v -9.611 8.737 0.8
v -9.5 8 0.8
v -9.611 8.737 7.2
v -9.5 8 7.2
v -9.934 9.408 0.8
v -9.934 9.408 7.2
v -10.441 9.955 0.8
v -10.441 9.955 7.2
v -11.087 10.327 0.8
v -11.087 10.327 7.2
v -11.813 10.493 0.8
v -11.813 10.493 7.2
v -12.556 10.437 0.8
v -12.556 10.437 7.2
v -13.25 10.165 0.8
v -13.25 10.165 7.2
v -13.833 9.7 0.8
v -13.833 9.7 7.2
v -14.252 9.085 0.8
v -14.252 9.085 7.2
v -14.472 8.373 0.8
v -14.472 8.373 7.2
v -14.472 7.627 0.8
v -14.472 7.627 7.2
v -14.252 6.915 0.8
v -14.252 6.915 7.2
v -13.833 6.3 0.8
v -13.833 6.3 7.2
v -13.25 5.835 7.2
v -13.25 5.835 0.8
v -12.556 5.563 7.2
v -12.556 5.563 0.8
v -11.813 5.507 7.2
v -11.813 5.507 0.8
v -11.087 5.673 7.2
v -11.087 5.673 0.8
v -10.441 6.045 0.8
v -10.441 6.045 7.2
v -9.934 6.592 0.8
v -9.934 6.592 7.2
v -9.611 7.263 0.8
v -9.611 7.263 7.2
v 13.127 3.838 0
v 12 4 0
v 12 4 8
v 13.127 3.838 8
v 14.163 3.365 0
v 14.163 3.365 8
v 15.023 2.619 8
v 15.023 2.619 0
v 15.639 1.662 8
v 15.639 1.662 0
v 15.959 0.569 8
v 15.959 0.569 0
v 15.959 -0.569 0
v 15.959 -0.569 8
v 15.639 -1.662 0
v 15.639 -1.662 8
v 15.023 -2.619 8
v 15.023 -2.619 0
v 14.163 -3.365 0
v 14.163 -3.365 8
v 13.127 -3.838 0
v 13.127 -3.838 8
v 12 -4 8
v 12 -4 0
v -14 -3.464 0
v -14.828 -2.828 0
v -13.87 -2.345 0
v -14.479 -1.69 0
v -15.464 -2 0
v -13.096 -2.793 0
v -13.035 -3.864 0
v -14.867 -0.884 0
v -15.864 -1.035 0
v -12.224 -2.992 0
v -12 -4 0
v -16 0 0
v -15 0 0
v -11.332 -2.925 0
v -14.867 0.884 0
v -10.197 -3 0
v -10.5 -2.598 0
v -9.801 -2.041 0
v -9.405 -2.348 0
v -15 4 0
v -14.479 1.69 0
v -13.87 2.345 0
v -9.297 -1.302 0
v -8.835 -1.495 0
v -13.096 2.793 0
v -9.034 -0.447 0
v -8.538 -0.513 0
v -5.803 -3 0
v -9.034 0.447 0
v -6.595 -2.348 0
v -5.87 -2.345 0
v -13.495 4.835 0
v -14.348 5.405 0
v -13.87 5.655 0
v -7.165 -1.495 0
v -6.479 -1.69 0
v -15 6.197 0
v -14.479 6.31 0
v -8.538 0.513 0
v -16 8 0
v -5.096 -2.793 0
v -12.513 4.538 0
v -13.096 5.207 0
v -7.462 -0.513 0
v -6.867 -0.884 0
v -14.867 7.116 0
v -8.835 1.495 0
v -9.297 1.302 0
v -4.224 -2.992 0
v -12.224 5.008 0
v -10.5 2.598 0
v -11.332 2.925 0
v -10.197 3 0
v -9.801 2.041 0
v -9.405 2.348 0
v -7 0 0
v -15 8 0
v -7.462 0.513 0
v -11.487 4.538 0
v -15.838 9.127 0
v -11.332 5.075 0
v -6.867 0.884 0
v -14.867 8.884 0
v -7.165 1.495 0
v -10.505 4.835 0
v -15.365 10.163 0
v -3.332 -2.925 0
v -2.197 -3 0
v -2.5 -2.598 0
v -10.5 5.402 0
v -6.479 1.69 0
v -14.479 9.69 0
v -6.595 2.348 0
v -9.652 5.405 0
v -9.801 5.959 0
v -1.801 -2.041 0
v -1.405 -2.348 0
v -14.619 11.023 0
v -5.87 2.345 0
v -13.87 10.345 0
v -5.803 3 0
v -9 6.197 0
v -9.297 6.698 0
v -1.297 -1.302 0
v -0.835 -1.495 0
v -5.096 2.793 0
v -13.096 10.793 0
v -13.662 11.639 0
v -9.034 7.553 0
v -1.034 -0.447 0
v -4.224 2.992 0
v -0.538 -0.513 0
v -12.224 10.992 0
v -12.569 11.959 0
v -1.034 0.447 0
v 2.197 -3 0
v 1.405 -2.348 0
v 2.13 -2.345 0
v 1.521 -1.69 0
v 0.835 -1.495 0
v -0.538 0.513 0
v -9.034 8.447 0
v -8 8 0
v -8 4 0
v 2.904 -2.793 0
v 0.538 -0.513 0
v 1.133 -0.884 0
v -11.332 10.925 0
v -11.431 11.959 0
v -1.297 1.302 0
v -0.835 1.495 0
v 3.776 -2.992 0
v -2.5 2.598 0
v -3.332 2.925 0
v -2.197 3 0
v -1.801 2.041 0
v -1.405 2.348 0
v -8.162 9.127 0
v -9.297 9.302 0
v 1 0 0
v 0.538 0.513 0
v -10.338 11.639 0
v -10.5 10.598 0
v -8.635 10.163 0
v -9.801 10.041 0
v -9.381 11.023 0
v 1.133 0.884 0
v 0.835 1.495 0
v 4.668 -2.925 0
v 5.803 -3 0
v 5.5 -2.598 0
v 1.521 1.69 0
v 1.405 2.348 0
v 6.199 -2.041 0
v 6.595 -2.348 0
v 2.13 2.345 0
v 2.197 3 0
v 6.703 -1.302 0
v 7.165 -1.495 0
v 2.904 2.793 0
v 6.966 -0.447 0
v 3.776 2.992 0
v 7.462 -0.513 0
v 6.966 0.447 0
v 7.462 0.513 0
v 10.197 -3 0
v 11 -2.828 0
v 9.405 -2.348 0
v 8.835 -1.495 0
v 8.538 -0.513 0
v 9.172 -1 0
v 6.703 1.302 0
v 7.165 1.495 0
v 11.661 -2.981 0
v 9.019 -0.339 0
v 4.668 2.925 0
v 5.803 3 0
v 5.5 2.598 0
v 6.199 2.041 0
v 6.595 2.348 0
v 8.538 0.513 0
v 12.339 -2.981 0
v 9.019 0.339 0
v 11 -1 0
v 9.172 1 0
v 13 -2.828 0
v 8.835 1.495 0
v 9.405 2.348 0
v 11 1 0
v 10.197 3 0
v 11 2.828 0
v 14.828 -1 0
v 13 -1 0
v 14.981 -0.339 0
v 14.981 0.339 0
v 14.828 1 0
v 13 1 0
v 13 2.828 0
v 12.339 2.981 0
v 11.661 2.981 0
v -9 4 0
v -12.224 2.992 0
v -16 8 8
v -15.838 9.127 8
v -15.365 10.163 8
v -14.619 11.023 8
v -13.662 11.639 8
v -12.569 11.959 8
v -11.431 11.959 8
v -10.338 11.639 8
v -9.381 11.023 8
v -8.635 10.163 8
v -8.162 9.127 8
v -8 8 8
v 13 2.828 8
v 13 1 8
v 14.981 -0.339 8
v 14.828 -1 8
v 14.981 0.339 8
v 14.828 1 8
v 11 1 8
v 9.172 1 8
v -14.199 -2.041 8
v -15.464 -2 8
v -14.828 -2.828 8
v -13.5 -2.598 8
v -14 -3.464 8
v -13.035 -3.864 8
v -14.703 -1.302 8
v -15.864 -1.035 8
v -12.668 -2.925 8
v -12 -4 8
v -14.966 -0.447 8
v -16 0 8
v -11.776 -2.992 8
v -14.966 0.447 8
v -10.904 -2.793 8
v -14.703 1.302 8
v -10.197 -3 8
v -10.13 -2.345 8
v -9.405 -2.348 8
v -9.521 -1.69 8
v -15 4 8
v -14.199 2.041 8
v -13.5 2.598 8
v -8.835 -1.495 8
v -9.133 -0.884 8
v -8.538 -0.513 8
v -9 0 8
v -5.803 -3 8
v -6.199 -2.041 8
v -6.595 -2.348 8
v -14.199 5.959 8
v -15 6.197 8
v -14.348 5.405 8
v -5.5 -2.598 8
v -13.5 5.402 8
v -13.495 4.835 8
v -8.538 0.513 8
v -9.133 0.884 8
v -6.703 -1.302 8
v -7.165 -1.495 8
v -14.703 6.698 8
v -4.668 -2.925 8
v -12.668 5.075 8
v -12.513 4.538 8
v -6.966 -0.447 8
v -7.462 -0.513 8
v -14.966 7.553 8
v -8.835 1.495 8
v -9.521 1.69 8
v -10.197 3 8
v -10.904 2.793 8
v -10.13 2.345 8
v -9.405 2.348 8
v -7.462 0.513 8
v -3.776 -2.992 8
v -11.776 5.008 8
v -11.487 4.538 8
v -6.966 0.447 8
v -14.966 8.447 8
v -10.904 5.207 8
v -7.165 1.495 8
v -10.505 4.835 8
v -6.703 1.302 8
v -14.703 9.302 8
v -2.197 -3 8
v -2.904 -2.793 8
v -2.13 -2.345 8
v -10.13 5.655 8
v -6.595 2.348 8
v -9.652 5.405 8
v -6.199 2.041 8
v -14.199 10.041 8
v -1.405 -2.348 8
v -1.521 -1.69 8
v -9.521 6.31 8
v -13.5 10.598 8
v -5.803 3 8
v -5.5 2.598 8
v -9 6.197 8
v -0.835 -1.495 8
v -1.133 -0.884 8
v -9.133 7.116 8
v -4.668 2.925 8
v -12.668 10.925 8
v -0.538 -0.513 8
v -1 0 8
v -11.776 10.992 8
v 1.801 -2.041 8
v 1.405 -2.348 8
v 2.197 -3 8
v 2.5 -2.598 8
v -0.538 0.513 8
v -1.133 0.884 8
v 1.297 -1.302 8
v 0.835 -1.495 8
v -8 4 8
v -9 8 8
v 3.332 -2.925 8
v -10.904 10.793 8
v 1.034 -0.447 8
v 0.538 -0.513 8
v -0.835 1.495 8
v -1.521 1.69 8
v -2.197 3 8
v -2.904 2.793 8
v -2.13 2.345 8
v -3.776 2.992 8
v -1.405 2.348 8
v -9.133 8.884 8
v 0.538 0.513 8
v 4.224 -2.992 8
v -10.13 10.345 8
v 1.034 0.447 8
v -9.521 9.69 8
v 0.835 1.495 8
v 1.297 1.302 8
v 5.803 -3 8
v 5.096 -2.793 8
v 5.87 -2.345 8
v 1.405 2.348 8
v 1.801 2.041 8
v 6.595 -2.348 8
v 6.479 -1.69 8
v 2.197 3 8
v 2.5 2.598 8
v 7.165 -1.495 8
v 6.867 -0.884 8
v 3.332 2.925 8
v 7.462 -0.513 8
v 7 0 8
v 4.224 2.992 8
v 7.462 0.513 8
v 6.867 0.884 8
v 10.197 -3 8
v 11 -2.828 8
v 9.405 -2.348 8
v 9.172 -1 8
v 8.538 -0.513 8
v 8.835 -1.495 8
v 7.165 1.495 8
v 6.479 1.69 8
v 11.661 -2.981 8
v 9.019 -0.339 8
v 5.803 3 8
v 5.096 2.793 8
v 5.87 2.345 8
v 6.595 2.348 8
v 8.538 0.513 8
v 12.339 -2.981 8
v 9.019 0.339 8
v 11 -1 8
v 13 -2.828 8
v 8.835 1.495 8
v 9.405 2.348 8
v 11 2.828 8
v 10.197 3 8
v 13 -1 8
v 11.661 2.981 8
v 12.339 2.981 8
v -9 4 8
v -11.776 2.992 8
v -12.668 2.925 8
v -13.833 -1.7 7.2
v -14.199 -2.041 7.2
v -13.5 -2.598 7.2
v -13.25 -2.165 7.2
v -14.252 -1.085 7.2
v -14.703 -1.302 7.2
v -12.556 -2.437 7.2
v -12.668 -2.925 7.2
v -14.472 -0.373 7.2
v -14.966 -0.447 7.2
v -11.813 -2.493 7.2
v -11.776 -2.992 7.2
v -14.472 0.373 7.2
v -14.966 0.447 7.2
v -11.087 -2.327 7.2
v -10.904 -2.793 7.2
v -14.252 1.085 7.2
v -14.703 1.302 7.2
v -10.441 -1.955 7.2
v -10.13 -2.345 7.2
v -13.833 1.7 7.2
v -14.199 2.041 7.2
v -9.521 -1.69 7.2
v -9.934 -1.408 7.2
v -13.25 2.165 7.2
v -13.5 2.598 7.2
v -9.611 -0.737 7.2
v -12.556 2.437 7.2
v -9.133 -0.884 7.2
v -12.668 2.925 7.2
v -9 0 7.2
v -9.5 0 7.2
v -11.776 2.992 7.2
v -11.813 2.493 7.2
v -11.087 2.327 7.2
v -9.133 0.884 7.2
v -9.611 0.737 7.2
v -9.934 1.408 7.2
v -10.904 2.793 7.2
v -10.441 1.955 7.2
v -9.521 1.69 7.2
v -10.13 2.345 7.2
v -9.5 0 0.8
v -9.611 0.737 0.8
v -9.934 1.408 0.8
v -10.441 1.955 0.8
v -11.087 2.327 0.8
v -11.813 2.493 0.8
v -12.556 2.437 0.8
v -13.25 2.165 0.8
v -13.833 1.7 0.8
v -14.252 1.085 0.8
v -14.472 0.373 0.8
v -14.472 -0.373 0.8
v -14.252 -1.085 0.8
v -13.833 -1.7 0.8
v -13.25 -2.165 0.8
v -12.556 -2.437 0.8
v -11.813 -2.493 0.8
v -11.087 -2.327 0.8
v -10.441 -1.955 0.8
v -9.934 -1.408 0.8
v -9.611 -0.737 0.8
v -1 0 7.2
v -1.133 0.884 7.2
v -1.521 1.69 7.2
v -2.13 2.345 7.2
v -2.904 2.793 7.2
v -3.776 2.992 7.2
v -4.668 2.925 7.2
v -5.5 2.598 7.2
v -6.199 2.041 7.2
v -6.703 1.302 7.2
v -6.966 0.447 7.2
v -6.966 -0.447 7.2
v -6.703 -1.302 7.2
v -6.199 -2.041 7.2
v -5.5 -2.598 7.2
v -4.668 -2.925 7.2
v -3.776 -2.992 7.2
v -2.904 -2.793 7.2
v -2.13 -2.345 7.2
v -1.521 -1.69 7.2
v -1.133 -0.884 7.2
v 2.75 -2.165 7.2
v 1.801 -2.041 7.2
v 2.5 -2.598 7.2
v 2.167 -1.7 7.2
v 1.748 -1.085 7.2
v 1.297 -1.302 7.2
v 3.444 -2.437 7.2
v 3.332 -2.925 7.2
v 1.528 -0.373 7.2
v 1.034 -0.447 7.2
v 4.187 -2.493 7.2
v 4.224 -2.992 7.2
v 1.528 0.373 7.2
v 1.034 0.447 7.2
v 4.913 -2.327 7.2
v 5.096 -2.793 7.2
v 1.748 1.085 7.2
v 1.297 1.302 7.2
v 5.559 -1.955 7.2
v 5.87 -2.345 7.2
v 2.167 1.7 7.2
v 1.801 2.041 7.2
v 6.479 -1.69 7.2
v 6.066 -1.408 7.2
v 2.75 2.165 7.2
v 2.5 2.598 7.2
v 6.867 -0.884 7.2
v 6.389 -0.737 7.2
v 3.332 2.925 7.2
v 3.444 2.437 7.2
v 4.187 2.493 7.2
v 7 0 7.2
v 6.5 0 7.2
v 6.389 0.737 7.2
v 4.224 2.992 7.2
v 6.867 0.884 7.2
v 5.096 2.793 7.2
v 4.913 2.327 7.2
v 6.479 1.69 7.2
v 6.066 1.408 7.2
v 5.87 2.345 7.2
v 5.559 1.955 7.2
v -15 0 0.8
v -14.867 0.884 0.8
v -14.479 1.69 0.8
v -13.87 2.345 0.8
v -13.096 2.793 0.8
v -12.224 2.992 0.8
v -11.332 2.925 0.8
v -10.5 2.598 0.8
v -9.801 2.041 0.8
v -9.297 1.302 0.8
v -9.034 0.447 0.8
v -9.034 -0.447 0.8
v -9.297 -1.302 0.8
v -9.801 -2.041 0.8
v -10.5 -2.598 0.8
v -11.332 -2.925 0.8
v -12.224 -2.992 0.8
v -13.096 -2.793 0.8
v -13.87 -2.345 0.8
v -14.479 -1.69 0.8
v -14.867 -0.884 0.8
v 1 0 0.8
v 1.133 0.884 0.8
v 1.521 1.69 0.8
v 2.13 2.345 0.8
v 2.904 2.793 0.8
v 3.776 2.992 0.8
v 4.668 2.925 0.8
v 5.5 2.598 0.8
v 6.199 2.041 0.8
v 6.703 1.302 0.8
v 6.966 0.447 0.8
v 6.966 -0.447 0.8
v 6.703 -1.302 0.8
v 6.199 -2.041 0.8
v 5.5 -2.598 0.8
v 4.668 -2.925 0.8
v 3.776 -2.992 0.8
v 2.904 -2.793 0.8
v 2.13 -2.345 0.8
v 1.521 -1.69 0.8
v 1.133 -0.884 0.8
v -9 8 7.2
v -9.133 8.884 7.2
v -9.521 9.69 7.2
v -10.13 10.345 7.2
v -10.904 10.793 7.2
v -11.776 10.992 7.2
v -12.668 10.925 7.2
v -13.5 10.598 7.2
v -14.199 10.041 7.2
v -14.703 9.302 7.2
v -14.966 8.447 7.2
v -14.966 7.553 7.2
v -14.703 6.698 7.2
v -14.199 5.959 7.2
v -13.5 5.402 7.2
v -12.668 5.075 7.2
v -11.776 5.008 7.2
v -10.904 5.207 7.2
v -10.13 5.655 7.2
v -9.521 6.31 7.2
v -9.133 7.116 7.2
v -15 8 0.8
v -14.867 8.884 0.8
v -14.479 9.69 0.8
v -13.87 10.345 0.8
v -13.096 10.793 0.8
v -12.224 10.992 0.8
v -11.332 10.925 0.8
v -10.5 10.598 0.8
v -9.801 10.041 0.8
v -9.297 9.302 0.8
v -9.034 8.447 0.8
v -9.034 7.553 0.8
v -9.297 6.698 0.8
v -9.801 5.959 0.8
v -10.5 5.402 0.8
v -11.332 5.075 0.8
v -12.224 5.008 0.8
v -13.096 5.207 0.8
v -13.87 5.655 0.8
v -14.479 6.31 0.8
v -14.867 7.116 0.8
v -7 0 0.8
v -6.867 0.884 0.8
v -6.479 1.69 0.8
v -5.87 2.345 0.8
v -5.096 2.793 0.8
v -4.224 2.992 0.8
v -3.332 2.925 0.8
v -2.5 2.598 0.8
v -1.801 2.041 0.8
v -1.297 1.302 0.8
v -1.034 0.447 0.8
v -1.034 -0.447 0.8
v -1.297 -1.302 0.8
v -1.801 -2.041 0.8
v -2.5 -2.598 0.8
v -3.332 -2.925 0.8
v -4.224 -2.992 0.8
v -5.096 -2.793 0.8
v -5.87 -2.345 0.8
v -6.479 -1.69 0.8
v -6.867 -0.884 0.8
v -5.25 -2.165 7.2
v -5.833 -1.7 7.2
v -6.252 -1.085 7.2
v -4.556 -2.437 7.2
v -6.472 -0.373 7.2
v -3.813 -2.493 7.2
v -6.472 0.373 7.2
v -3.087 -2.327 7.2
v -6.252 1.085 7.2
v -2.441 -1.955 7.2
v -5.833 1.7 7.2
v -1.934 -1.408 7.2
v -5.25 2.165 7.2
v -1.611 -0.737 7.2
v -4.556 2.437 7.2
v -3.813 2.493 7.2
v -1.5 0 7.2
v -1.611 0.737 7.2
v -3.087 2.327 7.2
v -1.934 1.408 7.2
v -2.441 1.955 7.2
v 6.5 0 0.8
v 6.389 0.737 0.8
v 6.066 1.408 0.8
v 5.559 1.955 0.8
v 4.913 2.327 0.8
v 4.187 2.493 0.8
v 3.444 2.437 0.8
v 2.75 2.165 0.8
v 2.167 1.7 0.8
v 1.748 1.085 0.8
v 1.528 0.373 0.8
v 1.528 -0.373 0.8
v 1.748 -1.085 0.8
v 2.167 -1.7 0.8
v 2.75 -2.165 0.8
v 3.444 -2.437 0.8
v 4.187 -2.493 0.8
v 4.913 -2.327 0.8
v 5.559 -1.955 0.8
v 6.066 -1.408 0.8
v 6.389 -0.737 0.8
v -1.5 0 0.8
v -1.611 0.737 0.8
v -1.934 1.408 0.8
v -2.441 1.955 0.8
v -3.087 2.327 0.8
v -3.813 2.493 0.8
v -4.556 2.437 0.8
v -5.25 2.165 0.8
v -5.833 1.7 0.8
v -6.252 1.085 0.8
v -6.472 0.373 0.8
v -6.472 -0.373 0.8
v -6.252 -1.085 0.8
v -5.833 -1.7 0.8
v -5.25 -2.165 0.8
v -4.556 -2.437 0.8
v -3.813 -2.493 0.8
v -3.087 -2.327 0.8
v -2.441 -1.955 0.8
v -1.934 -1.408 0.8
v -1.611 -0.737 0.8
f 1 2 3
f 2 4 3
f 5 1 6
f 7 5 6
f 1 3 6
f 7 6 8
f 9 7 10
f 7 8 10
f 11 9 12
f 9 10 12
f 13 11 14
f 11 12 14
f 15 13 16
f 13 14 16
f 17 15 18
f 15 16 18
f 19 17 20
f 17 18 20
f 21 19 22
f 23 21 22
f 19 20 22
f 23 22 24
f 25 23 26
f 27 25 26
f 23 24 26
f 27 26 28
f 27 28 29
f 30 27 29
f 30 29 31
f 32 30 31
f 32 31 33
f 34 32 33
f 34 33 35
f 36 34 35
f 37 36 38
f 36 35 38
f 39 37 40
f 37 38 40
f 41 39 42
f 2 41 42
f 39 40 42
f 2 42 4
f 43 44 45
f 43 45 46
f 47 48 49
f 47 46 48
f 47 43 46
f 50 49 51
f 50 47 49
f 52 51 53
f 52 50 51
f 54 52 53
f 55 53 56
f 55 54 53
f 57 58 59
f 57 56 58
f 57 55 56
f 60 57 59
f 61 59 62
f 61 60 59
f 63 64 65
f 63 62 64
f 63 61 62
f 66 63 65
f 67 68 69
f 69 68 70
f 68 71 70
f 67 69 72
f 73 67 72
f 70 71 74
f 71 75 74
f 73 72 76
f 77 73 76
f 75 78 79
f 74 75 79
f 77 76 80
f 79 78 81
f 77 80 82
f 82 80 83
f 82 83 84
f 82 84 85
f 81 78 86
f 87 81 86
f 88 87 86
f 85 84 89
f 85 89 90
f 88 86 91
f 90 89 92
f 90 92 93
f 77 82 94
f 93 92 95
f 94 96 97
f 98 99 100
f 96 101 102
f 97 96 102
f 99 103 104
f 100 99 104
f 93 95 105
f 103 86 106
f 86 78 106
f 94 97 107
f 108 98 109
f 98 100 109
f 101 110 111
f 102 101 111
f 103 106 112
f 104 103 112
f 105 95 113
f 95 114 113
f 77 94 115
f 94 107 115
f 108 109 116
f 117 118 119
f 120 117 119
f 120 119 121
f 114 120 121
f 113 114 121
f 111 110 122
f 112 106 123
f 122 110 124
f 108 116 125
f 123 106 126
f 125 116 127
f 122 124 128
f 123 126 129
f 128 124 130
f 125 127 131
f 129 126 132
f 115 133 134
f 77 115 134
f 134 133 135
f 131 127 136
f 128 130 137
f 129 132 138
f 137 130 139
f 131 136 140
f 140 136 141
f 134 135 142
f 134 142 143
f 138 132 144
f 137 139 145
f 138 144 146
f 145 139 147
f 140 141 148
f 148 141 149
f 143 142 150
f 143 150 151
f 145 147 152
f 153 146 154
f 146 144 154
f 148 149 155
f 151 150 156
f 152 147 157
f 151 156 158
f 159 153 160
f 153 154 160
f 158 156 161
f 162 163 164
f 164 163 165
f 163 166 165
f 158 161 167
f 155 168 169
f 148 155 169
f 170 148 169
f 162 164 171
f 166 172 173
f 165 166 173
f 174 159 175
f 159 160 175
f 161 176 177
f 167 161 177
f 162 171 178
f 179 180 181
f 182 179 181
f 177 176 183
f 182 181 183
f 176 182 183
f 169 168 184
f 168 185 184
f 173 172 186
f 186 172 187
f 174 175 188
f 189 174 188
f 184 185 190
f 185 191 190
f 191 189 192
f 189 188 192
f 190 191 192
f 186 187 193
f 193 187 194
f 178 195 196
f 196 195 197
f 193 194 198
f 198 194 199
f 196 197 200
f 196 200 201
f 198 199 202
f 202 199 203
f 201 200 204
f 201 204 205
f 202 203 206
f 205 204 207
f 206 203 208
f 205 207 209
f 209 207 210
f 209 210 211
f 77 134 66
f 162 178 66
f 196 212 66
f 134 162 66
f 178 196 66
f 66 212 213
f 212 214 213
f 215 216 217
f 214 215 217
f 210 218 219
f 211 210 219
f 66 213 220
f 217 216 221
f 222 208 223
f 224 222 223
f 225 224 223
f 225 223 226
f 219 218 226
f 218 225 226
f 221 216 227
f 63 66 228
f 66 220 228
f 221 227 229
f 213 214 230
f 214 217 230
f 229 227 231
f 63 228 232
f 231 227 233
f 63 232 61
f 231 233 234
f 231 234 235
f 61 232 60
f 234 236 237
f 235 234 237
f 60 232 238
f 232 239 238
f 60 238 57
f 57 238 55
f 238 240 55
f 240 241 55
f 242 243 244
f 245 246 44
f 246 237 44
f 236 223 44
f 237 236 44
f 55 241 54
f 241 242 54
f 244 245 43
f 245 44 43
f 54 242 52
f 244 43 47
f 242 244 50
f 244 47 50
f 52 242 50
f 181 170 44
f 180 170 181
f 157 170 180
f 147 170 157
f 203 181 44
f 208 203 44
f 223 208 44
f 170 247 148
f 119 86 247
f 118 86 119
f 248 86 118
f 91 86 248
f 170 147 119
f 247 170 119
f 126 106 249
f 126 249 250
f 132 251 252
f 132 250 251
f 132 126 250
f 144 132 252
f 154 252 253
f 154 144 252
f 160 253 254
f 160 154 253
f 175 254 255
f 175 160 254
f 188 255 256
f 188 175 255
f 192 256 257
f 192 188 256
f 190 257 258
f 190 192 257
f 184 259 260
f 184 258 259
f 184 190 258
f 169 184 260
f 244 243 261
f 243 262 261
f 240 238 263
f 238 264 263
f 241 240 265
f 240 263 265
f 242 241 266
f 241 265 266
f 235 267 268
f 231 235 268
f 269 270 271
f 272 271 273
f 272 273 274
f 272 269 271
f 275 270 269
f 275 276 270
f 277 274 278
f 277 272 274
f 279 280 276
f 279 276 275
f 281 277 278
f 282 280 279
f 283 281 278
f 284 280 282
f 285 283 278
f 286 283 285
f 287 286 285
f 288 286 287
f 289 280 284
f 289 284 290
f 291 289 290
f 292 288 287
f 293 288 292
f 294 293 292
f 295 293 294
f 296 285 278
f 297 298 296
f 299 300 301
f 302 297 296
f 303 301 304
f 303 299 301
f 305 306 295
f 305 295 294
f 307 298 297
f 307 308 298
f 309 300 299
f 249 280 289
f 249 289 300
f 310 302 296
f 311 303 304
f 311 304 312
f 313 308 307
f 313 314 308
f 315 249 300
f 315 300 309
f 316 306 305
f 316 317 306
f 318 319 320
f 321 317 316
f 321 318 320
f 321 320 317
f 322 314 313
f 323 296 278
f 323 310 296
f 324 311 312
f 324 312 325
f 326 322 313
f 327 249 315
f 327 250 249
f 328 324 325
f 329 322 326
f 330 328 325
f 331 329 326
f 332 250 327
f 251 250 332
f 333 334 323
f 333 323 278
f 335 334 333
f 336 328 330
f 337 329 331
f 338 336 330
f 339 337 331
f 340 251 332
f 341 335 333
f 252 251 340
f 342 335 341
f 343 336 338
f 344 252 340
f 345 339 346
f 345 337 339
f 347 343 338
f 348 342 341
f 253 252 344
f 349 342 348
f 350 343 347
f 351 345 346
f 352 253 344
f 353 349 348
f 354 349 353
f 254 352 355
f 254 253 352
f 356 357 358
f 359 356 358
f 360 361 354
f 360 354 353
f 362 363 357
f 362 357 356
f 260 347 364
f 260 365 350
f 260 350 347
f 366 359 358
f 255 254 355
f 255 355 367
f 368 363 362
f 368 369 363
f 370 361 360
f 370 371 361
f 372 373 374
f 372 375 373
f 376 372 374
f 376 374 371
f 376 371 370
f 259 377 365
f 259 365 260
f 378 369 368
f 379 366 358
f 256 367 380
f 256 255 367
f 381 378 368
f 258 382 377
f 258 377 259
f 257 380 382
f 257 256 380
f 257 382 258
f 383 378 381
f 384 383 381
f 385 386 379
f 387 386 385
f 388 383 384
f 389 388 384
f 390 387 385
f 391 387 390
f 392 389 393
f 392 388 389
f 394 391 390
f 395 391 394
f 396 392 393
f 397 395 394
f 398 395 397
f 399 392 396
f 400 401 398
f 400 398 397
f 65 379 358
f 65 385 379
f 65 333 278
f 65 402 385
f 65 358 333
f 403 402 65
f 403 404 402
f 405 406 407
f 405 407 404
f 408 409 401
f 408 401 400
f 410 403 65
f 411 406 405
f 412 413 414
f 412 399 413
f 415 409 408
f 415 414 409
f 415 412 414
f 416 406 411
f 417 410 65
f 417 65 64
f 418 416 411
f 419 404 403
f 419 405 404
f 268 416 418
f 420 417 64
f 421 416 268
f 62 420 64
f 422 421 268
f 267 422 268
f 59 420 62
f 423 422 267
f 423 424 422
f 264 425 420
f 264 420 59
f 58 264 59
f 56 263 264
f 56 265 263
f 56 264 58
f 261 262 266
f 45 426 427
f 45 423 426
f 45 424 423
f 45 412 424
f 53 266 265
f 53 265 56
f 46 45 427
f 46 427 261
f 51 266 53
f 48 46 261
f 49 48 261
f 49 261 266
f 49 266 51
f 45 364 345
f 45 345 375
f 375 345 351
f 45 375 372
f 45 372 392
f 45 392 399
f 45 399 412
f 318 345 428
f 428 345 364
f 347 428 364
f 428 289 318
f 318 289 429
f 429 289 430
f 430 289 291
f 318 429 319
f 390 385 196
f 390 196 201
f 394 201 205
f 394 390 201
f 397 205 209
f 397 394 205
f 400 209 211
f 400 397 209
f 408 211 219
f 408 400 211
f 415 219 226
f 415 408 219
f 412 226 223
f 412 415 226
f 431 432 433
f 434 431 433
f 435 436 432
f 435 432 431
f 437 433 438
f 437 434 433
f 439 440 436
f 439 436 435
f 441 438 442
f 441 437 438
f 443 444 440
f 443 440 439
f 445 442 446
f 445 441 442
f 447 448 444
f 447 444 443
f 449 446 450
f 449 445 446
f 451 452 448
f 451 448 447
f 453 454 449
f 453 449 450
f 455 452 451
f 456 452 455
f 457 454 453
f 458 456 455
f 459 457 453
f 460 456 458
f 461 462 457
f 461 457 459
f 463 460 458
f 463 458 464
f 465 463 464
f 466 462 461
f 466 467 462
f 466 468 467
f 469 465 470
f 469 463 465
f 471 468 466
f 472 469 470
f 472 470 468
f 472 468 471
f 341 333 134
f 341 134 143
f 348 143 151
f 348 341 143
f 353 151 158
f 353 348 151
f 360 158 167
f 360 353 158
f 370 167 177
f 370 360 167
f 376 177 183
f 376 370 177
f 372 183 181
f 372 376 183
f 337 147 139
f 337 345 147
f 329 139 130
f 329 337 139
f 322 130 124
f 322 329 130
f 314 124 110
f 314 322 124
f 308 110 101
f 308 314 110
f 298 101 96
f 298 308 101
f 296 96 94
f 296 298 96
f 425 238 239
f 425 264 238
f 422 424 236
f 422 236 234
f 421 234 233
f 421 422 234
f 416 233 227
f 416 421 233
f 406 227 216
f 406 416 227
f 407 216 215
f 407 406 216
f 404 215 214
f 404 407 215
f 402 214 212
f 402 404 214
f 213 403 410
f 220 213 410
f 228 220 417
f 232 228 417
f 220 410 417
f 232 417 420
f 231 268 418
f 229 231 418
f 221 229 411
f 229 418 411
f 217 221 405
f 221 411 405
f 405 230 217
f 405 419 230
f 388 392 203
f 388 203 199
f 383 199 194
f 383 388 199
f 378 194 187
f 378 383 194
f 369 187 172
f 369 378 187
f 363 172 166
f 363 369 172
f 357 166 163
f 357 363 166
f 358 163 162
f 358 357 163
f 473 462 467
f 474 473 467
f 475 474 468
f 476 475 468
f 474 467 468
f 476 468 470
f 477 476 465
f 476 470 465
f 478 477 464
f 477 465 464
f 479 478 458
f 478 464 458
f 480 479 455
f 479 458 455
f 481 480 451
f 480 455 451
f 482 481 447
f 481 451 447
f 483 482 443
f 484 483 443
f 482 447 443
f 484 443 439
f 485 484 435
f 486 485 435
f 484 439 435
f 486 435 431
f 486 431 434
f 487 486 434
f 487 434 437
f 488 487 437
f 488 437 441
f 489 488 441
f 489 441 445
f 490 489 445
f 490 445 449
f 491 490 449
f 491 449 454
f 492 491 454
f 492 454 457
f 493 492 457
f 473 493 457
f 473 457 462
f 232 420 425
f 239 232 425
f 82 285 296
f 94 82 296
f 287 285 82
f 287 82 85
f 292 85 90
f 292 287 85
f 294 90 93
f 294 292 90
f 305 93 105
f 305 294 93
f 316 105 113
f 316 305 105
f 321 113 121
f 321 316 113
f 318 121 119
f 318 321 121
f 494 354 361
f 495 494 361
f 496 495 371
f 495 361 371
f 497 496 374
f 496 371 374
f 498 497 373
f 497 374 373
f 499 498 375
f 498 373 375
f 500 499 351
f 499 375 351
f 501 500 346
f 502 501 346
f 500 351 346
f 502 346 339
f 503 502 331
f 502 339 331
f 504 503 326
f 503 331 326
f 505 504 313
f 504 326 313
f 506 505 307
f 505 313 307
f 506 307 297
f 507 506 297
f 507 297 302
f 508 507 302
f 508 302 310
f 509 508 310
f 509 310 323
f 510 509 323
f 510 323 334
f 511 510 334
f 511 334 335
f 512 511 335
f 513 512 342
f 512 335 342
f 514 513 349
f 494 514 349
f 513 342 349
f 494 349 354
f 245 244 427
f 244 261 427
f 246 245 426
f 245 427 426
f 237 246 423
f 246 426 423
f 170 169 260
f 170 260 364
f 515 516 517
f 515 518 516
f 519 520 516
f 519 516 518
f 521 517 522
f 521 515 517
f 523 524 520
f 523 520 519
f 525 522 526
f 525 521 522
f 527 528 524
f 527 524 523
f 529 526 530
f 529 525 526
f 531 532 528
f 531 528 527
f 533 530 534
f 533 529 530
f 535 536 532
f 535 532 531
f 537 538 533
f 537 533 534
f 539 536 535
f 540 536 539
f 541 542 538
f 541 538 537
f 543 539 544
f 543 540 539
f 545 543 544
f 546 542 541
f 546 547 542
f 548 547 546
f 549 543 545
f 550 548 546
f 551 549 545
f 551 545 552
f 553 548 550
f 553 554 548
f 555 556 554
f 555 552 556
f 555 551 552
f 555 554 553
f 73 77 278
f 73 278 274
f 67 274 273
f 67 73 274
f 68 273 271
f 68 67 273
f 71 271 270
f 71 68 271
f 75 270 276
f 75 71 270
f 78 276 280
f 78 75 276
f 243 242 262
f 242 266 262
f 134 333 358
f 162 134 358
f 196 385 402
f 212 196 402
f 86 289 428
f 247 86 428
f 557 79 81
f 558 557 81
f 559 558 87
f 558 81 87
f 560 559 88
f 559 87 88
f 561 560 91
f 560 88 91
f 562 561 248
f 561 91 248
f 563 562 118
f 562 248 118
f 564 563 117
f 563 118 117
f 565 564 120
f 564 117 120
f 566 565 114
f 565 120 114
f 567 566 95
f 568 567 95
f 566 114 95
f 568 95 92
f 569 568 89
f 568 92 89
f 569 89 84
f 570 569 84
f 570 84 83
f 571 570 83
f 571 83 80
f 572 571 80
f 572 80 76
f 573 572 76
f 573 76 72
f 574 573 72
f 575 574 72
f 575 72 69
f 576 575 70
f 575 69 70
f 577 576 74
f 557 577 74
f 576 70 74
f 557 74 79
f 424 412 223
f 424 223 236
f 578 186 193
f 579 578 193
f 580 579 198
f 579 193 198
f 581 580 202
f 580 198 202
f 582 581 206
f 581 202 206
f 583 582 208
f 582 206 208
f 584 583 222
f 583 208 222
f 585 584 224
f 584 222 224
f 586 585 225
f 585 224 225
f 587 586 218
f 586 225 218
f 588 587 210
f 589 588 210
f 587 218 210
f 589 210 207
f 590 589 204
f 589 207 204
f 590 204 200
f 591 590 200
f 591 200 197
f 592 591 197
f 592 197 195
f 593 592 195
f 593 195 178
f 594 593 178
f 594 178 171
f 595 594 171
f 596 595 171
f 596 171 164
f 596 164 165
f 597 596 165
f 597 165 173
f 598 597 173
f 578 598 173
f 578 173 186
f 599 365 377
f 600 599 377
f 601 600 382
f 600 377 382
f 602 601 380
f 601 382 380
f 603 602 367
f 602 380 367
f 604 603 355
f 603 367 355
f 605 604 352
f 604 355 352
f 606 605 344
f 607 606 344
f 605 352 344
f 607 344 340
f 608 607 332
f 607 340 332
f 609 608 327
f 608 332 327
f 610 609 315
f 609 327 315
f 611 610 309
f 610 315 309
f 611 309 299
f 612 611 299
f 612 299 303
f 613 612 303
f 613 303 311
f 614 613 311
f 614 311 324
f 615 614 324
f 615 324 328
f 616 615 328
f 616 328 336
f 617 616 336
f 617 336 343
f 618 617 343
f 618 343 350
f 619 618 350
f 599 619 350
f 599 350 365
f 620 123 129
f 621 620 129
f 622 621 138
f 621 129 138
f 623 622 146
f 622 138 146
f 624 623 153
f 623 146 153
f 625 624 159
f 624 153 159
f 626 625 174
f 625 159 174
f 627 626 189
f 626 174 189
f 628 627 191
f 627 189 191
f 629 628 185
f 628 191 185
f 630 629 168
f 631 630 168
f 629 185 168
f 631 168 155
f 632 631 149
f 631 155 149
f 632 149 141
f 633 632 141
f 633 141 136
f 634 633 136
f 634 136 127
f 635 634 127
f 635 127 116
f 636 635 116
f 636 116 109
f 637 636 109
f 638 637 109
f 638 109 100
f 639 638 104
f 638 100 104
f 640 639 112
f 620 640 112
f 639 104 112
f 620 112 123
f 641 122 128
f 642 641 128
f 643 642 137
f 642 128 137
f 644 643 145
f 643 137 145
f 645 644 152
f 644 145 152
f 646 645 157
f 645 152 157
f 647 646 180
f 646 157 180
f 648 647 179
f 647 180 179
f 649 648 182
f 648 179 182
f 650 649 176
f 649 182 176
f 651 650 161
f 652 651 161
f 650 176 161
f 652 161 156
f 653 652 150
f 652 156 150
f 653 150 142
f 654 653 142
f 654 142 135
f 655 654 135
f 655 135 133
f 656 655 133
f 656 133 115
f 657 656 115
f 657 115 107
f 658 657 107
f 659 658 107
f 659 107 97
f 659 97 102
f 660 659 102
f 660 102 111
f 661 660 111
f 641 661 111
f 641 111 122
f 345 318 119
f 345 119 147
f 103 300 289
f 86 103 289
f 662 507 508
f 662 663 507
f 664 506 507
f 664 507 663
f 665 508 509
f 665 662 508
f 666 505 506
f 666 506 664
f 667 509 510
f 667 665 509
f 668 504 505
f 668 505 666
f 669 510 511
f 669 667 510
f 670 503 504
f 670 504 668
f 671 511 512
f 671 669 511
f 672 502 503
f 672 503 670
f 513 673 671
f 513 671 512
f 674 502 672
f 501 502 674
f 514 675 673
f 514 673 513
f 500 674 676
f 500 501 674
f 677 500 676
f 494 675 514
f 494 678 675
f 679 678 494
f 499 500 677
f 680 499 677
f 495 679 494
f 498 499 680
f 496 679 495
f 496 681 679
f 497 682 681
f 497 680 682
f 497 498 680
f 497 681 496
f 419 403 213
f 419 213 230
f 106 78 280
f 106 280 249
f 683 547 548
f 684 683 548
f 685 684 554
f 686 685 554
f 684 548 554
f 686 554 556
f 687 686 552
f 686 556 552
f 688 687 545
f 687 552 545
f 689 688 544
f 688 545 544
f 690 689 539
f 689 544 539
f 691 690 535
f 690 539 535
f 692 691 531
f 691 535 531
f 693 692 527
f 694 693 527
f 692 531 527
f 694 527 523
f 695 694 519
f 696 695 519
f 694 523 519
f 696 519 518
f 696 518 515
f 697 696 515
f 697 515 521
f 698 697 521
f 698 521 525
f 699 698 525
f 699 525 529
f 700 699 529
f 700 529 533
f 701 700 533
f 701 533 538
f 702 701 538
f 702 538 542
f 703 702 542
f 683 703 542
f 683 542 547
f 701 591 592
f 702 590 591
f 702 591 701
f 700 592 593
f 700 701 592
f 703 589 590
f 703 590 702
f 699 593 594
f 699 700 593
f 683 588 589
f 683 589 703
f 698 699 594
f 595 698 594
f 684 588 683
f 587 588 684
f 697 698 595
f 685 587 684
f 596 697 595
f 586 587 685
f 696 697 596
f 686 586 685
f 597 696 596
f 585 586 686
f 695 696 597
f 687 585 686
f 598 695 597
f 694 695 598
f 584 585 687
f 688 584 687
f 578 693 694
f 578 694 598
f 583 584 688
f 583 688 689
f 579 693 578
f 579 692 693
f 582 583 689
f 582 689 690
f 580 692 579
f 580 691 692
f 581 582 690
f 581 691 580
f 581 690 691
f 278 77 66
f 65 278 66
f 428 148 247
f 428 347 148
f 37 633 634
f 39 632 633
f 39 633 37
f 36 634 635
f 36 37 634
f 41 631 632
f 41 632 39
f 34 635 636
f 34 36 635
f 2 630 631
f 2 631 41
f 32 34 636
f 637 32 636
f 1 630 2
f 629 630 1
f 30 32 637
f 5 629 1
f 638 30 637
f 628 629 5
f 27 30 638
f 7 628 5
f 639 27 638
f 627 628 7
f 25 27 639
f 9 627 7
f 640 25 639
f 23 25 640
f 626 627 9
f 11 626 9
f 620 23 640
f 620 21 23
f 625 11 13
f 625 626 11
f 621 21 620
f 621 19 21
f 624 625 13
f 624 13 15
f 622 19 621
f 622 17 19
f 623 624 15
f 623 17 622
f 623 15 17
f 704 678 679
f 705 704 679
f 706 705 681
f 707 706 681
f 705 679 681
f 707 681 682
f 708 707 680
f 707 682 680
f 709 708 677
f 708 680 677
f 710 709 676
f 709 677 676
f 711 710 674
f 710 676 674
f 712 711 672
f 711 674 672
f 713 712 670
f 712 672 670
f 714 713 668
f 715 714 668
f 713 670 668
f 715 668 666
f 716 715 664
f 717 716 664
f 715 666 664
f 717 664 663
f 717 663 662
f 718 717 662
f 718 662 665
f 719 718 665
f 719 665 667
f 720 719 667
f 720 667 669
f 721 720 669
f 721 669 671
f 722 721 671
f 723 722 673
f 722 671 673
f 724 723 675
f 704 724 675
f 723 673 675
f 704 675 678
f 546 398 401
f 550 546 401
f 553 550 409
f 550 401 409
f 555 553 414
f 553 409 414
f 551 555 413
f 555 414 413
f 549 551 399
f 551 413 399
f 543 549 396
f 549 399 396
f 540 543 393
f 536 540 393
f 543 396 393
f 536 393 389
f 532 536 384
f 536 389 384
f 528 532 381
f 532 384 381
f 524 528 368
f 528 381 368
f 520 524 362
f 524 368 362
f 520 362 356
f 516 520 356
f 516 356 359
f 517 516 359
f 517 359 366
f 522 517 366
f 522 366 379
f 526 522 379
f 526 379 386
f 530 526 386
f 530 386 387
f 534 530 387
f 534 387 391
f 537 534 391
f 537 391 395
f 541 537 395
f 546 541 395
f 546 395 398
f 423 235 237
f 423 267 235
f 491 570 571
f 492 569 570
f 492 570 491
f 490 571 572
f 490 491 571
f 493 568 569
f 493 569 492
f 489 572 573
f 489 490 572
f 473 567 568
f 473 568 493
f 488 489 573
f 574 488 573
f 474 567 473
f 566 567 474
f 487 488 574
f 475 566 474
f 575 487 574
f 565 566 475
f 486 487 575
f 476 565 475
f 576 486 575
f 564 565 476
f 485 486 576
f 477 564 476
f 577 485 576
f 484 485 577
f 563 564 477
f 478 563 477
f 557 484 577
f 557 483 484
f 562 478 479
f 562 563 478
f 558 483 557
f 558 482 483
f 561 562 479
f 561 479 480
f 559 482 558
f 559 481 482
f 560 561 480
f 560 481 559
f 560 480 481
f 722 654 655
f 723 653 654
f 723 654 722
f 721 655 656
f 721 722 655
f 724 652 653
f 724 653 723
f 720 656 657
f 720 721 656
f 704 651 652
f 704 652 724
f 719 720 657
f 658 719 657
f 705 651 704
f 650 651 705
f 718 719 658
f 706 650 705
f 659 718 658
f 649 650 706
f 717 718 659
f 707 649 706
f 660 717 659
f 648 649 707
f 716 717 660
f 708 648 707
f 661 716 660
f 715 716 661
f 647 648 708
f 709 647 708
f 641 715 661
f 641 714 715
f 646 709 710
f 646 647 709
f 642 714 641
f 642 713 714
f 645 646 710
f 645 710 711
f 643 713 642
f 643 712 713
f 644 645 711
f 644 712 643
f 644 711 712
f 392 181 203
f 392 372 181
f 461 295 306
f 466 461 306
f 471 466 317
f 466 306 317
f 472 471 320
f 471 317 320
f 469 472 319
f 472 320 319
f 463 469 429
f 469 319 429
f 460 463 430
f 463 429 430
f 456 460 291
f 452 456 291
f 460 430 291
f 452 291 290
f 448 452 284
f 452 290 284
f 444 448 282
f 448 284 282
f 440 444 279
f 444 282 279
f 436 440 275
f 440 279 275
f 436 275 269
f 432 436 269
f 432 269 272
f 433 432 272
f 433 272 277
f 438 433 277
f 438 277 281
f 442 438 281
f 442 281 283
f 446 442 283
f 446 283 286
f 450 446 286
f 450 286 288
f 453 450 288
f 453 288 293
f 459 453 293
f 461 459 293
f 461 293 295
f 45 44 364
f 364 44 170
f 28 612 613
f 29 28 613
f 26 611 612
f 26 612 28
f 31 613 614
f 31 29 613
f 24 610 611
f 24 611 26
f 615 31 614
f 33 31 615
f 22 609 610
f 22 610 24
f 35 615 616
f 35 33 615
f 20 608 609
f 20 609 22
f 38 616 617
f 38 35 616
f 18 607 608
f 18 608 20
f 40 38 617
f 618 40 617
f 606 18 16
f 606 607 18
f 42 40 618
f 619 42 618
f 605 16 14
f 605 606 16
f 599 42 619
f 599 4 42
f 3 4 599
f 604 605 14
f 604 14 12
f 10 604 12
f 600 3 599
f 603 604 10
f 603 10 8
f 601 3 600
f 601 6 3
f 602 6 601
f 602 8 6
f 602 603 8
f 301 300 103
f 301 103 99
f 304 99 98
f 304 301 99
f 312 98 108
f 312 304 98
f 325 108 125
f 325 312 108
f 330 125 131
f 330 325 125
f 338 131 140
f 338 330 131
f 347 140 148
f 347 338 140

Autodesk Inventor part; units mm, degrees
ref_plane "YZ Plane" through (0, 0, 0) normal (1, 0, 0) x (0, 1, 0)
ref_plane "XZ Plane" through (0, 0, 0) normal (0, 1, 0) x (-1, 0, 0)
ref_plane "XY Plane" through (0, 0, 0) normal (0, 0, 1) x (1, 0, 0)
sketch "Sketch1" plane through (0, 0, 0) normal (0, 0, 1) x (1, 0, 0)
  arc A0 (-16, 0) -> (-12, -4) centre (-12, 0) ccw
  arc A1 (-8, 8) -> (-16, 8) centre (-12, 8) ccw
  line L0 (-16, 0) -> (-16, 8)
  line L1 (-8, 8) -> (-8, 4)
  arc A2 (12, -4) -> (12, 4) centre (12, 0) ccw
  line L2 (-12, -4) -> (12, -4)
  line L3 (12, 4) -> (-8, 4)
  line L4 (-23.3941, 0) -> (22.5657, 0) projected
  line L5 (0, -8.1941) -> (0, 15.3657) projected
  point P0 (0, 0)
  dimension "d3" = 4
  dimension "d4" = 4
  dimension "d5" = 4
  dimension "d6" = 24
  dimension "d7" = 8
  dimension "d10" = 0
  dimension "d12" = 90
  dimension "d14" = 4
  dimension "d15" = 4
  dimension "d16" = 12
  dimension "d123" = 12
extrude "Extrusion1" add sketch "Sketch1" along normal blind 8
sketch "Sketch13" plane through (0, 0, 8) normal (0, 0, 1) x (1, 0, 0)
  arc A0 (12, -4) -> (12, 4) centre (12, 0) ccw projected
  line L0 (-8, 8) -> (-8, 4) projected
  arc A1 (9.1716, 1) -> (9.1716, -1) centre (12, 0) ccw
  arc A2 (11, -2.8284) -> (13, -2.8284) centre (12, 0) ccw
  arc A3 (14.8284, -1) -> (14.8284, 1) centre (12, 0) ccw
  arc A4 (13, 2.8284) -> (11, 2.8284) centre (12, 0) ccw
  line L1 (14.8284, 1) -> (13, 1)
  line L2 (11, 1) -> (9.1716, 1)
  line L3 (11, -2.8284) -> (11, -1)
  line L4 (11, 1) -> (11, 2.8284)
  line L5 (14.8284, -1) -> (13, -1)
  line L6 (11, -1) -> (9.1716, -1)
  line L7 (13, -2.8284) -> (13, -1)
  line L8 (13, 1) -> (13, 2.8284)
  point P0 (0, 0)
  dimension "d125" = 3
  dimension "d126" = 3
  dimension "d127" = 3
  dimension "d128" = 3
  dimension "d129" = 2
  dimension "d130" = 2
  dimension "d131" = 2
  dimension "d132" = 2
  dimension "d133" = 1
  dimension "d134" = 1
  dimension "d135" = 1
  dimension "d136" = 1
extrude "Extrusion13" cut sketch "Sketch13" against normal through all
sketch "Sketch14" plane through (0, 0, 8) normal (0, 0, 1) x (1, 0, 0)
  arc A0 (-16, 0) -> (-12, -4) centre (-12, 0) ccw projected
  line L0 (-8, 4) -> (12, 4) projected
  arc A1 (-8, 8) -> (-16, 8) centre (-12, 8) ccw projected
  circle A2 centre (-12, 0) radius 2.5
  circle A3 centre (-12, 8) radius 2.5
  circle A4 centre (-4, 0) radius 2.5
  circle A5 centre (4, 0) radius 2.5
  point P0 (0, 0)
  dimension "d139" = 5
  dimension "d140" = 5
  dimension "d146" = 8
extrude "Extrusion14" cut sketch "Sketch14" against normal through all
sketch "Sketch15" plane through (0, 0, 8) normal (0, 0, 1) x (1, 0, 0)
  circle A0 centre (4, 0) radius 2.5 projected
  circle A1 centre (-4, 0) radius 2.5 projected
  circle A2 centre (-12, 8) radius 2.5 projected
  circle A3 centre (-12, 0) radius 2.5 projected
  arc A4 (-16, 0) -> (-12, -4) centre (-12, 0) ccw projected
  arc A5 (-8, 8) -> (-16, 8) centre (-12, 8) ccw projected
  circle A6 centre (-12, 0) radius 3
  circle A7 centre (-4, 0) radius 3
  circle A8 centre (4, 0) radius 3
  circle A9 centre (-12, 8) radius 3
  point P0 (0, 0)
  dimension "d150" = 6
  dimension "d151" = 6
  dimension "d152" = 6
  dimension "d153" = 6
extrude "Extrusion15" cut sketch "Sketch15" against normal blind 0.8
sketch "Sketch16" plane through (0, 0, 0) normal (0, 0, -1) x (-1, 0, 0)
  circle A0 centre (-4, 0) radius 2.5 projected
  circle A1 centre (4, 0) radius 2.5 projected
  circle A2 centre (12, 8) radius 2.5 projected
  circle A3 centre (12, 0) radius 2.5 projected
  arc A4 (12, -4) -> (16, 0) centre (12, 0) ccw projected
  arc A5 (16, 8) -> (8, 8) centre (12, 8) ccw projected
  circle A6 centre (12, 8) radius 3
  circle A7 centre (12, 0) radius 3
  circle A8 centre (4, 0) radius 3
  circle A9 centre (-4, 0) radius 3
  point P0 (0, 0)
  dimension "d156" = 6
  dimension "d157" = 6
  dimension "d158" = 6
  dimension "d159" = 6
extrude "Extrusion16" cut sketch "Sketch16" against normal blind 0.8
sketch "Sketch17" plane through (0, 0, 8) normal (0, 0, 1) x (1, 0, 0)
  circle A0 centre (-12, 8) radius 3 projected
  circle A1 centre (-4, 0) radius 3 projected
  circle A2 centre (-12, 0) radius 3 projected
  arc A3 (-16, 0) -> (-12, -4) centre (-12, 0) ccw projected
  line L0 (-8, 4) -> (12, 4) projected
  line L1 (-8, 8) -> (-8, 4) projected
  arc A4 (-8, 8) -> (-16, 8) centre (-12, 8) ccw projected
  arc A5 (-10.1972, -3) -> (-10.1972, 3) centre (-12, 0) ccw
  arc A6 (-5.8028, 3) -> (-5.8028, -3) centre (-4, 0) ccw
  arc A7 (-15, 6.1972) -> (-9, 6.1972) centre (-12, 8) ccw
  line L2 (-10.1972, 3) -> (-5.8028, 3)
  line L3 (-10.1972, -3) -> (-5.8028, -3)
  line L4 (-15, 6.1972) -> (-15, 4)
  line L5 (-9, 6.1972) -> (-9, 4)
  line L6 (-15, 4) -> (-9, 4)
  arc A8 (-2.1972, -3) -> (-2.1972, 3) centre (-4, 0) ccw
  arc A9 (2.1972, 3) -> (2.1972, -3) centre (4, 0) ccw
  line L7 (-2.1972, 3) -> (2.1972, 3)
  line L8 (-2.1972, -3) -> (2.1972, -3)
  arc A10 (5.8028, -3) -> (5.8028, 3) centre (4, 0) ccw
  arc A11 (10.1972, 3) -> (10.1972, -3) centre (12, 0) ccw
  line L9 (5.8028, 3) -> (10.1972, 3)
  line L10 (5.8028, -3) -> (10.1972, -3)
  point P0 (0, 0)
  dimension "d162" = 7
  dimension "d163" = 7
  dimension "d164" = 7
  dimension "d165" = 6
  dimension "d166" = 4
  dimension "d172" = 8
extrude "Extrusion17" cut sketch "Sketch17" against normal through all contours A5 L2 A6 L3 | A7 L5 L6 L4 | A8 L7 A9 L8 | A10 L9 A11 L10
properties part number "5MRA Beam"
